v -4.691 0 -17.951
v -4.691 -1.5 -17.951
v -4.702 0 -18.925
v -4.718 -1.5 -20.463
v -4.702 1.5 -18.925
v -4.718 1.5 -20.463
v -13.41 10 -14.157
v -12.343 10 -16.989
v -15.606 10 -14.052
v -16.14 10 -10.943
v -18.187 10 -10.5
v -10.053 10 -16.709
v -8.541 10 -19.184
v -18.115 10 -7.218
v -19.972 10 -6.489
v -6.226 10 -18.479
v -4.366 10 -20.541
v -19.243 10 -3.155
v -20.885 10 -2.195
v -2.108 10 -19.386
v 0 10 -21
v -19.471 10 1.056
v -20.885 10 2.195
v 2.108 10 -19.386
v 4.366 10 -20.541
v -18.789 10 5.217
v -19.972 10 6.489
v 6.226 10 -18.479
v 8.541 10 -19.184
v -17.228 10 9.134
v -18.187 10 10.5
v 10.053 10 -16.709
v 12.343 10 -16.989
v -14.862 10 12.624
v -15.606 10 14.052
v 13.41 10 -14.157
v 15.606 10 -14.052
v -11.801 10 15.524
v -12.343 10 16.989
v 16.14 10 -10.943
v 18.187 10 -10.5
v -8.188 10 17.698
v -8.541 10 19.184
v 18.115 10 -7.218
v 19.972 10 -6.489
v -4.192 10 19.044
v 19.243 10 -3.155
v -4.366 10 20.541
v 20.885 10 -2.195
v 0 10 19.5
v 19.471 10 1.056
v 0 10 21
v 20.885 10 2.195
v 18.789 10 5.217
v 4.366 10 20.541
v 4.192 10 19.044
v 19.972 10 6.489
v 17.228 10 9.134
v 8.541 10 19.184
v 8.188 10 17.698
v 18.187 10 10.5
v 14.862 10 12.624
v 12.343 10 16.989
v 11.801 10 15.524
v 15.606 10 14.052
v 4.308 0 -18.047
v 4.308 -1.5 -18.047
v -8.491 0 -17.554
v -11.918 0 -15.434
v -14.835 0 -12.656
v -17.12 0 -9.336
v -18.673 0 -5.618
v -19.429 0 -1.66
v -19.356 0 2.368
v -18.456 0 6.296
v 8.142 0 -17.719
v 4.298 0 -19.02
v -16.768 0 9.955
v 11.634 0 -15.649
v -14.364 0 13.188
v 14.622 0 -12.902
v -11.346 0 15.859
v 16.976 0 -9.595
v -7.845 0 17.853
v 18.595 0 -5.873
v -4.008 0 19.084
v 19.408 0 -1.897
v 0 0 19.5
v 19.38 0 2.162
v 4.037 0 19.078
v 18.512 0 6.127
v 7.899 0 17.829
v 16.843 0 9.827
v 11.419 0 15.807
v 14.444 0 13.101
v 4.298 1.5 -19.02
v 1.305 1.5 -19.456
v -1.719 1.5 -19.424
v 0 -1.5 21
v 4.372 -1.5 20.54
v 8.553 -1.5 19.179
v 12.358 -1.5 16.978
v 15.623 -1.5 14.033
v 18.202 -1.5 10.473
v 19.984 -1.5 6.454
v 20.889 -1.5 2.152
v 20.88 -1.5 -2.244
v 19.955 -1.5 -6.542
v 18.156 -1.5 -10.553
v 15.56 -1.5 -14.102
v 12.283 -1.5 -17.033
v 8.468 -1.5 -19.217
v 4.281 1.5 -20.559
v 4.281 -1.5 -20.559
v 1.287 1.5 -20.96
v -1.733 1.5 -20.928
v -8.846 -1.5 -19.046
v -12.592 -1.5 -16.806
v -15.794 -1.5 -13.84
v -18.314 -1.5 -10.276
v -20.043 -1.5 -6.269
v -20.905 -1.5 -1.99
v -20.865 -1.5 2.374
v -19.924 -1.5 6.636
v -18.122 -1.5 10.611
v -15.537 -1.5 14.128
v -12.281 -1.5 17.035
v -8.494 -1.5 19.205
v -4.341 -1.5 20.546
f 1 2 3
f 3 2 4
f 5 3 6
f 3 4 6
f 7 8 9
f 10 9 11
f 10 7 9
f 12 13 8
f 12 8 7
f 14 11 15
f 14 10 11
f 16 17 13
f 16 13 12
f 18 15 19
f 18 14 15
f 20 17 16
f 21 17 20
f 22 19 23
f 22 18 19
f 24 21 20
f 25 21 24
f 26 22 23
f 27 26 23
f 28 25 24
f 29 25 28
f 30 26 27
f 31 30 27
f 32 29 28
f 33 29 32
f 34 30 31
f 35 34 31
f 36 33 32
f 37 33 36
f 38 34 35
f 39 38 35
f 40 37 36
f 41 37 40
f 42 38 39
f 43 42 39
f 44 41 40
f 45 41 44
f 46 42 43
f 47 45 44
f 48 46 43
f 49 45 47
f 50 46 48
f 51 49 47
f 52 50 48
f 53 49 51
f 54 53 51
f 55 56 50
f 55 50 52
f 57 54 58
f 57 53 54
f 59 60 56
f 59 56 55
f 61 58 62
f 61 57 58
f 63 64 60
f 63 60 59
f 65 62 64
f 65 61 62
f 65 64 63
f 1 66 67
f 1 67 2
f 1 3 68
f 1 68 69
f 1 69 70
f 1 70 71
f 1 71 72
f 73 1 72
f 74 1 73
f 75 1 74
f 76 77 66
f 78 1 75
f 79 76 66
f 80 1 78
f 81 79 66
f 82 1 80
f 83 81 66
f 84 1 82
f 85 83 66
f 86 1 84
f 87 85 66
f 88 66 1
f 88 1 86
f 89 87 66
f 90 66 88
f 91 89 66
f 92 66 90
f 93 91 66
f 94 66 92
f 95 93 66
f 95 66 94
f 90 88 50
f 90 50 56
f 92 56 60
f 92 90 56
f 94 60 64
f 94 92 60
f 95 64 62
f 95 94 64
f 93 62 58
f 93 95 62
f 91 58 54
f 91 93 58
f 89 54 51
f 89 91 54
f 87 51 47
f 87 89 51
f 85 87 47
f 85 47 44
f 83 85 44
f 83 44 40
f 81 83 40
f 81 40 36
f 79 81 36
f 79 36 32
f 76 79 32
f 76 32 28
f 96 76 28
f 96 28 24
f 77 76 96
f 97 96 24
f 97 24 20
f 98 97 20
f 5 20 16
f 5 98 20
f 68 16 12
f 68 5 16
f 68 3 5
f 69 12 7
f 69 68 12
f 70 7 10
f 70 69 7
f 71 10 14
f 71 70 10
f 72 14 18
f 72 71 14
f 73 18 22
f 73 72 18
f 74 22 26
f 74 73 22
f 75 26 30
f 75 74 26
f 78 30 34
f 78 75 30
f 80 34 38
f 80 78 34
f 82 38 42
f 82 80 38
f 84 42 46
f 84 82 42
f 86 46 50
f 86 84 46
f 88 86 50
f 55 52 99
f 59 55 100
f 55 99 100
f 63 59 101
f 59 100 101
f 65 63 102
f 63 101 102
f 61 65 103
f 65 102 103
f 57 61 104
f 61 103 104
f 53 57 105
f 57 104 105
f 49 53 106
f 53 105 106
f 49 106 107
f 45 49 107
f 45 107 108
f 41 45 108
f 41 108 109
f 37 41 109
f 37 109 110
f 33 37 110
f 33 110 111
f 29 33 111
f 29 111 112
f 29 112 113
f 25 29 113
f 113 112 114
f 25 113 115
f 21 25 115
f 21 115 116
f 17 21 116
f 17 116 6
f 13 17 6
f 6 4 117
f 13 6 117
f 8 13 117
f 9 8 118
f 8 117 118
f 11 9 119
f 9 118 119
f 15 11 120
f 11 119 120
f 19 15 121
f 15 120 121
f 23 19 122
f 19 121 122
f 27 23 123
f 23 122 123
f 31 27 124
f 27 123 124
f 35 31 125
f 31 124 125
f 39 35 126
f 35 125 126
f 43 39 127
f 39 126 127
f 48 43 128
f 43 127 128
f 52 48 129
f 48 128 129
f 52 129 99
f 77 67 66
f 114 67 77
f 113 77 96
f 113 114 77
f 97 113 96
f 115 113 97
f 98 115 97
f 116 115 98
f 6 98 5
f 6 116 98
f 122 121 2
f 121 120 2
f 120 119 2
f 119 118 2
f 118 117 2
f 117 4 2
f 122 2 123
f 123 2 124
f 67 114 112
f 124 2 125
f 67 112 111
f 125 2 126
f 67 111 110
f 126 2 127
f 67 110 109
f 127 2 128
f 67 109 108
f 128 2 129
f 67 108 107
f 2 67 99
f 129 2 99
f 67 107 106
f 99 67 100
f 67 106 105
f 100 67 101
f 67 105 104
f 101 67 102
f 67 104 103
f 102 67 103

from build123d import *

# Parameters (mm, degrees)
SKETCH1_R           = 19.5
BOSS_EXTRUDE1_DEPTH = 10
SHELL1_T            = 1.5
SKETCH2_W           = 9
SKETCH2_H           = 6
CUT_EXTRUDE1_DEPTH  = 3


with BuildPart() as part:
    # Sketch1 → Boss-Extrude1 (new body)
    with BuildSketch(Plane(origin=(0, 0, 0), x_dir=(1, 0, 0), z_dir=(0, 1, 0))):
        with Locations(Location((0, 0, 0), (0, 0, 270))):
            Circle(SKETCH1_R)
    extrude(amount=BOSS_EXTRUDE1_DEPTH)

    # Shell1
    shell1_openings = [part.faces().sort_by_distance(p)[0] for p in [
        (0, 10, 0),
    ]]
    offset(amount=SHELL1_T, openings=shell1_openings, kind=Kind.INTERSECTION)

    # Sketch2 → Cut-Extrude1 (cut)
    with BuildSketch(Plane(origin=(-35.117811043, 32.6041754, -20.627520882), x_dir=(-0.9999433956533795, 0, 0.010639806821049314), z_dir=(-0.010639806821049314, 0, -0.9999433956533795))):
        with Locations((-34.896350385, -34.1041754)):
            Rectangle(SKETCH2_W, SKETCH2_H)
    extrude(amount=-CUT_EXTRUDE1_DEPTH, mode=Mode.SUBTRACT)


solid = part.part
